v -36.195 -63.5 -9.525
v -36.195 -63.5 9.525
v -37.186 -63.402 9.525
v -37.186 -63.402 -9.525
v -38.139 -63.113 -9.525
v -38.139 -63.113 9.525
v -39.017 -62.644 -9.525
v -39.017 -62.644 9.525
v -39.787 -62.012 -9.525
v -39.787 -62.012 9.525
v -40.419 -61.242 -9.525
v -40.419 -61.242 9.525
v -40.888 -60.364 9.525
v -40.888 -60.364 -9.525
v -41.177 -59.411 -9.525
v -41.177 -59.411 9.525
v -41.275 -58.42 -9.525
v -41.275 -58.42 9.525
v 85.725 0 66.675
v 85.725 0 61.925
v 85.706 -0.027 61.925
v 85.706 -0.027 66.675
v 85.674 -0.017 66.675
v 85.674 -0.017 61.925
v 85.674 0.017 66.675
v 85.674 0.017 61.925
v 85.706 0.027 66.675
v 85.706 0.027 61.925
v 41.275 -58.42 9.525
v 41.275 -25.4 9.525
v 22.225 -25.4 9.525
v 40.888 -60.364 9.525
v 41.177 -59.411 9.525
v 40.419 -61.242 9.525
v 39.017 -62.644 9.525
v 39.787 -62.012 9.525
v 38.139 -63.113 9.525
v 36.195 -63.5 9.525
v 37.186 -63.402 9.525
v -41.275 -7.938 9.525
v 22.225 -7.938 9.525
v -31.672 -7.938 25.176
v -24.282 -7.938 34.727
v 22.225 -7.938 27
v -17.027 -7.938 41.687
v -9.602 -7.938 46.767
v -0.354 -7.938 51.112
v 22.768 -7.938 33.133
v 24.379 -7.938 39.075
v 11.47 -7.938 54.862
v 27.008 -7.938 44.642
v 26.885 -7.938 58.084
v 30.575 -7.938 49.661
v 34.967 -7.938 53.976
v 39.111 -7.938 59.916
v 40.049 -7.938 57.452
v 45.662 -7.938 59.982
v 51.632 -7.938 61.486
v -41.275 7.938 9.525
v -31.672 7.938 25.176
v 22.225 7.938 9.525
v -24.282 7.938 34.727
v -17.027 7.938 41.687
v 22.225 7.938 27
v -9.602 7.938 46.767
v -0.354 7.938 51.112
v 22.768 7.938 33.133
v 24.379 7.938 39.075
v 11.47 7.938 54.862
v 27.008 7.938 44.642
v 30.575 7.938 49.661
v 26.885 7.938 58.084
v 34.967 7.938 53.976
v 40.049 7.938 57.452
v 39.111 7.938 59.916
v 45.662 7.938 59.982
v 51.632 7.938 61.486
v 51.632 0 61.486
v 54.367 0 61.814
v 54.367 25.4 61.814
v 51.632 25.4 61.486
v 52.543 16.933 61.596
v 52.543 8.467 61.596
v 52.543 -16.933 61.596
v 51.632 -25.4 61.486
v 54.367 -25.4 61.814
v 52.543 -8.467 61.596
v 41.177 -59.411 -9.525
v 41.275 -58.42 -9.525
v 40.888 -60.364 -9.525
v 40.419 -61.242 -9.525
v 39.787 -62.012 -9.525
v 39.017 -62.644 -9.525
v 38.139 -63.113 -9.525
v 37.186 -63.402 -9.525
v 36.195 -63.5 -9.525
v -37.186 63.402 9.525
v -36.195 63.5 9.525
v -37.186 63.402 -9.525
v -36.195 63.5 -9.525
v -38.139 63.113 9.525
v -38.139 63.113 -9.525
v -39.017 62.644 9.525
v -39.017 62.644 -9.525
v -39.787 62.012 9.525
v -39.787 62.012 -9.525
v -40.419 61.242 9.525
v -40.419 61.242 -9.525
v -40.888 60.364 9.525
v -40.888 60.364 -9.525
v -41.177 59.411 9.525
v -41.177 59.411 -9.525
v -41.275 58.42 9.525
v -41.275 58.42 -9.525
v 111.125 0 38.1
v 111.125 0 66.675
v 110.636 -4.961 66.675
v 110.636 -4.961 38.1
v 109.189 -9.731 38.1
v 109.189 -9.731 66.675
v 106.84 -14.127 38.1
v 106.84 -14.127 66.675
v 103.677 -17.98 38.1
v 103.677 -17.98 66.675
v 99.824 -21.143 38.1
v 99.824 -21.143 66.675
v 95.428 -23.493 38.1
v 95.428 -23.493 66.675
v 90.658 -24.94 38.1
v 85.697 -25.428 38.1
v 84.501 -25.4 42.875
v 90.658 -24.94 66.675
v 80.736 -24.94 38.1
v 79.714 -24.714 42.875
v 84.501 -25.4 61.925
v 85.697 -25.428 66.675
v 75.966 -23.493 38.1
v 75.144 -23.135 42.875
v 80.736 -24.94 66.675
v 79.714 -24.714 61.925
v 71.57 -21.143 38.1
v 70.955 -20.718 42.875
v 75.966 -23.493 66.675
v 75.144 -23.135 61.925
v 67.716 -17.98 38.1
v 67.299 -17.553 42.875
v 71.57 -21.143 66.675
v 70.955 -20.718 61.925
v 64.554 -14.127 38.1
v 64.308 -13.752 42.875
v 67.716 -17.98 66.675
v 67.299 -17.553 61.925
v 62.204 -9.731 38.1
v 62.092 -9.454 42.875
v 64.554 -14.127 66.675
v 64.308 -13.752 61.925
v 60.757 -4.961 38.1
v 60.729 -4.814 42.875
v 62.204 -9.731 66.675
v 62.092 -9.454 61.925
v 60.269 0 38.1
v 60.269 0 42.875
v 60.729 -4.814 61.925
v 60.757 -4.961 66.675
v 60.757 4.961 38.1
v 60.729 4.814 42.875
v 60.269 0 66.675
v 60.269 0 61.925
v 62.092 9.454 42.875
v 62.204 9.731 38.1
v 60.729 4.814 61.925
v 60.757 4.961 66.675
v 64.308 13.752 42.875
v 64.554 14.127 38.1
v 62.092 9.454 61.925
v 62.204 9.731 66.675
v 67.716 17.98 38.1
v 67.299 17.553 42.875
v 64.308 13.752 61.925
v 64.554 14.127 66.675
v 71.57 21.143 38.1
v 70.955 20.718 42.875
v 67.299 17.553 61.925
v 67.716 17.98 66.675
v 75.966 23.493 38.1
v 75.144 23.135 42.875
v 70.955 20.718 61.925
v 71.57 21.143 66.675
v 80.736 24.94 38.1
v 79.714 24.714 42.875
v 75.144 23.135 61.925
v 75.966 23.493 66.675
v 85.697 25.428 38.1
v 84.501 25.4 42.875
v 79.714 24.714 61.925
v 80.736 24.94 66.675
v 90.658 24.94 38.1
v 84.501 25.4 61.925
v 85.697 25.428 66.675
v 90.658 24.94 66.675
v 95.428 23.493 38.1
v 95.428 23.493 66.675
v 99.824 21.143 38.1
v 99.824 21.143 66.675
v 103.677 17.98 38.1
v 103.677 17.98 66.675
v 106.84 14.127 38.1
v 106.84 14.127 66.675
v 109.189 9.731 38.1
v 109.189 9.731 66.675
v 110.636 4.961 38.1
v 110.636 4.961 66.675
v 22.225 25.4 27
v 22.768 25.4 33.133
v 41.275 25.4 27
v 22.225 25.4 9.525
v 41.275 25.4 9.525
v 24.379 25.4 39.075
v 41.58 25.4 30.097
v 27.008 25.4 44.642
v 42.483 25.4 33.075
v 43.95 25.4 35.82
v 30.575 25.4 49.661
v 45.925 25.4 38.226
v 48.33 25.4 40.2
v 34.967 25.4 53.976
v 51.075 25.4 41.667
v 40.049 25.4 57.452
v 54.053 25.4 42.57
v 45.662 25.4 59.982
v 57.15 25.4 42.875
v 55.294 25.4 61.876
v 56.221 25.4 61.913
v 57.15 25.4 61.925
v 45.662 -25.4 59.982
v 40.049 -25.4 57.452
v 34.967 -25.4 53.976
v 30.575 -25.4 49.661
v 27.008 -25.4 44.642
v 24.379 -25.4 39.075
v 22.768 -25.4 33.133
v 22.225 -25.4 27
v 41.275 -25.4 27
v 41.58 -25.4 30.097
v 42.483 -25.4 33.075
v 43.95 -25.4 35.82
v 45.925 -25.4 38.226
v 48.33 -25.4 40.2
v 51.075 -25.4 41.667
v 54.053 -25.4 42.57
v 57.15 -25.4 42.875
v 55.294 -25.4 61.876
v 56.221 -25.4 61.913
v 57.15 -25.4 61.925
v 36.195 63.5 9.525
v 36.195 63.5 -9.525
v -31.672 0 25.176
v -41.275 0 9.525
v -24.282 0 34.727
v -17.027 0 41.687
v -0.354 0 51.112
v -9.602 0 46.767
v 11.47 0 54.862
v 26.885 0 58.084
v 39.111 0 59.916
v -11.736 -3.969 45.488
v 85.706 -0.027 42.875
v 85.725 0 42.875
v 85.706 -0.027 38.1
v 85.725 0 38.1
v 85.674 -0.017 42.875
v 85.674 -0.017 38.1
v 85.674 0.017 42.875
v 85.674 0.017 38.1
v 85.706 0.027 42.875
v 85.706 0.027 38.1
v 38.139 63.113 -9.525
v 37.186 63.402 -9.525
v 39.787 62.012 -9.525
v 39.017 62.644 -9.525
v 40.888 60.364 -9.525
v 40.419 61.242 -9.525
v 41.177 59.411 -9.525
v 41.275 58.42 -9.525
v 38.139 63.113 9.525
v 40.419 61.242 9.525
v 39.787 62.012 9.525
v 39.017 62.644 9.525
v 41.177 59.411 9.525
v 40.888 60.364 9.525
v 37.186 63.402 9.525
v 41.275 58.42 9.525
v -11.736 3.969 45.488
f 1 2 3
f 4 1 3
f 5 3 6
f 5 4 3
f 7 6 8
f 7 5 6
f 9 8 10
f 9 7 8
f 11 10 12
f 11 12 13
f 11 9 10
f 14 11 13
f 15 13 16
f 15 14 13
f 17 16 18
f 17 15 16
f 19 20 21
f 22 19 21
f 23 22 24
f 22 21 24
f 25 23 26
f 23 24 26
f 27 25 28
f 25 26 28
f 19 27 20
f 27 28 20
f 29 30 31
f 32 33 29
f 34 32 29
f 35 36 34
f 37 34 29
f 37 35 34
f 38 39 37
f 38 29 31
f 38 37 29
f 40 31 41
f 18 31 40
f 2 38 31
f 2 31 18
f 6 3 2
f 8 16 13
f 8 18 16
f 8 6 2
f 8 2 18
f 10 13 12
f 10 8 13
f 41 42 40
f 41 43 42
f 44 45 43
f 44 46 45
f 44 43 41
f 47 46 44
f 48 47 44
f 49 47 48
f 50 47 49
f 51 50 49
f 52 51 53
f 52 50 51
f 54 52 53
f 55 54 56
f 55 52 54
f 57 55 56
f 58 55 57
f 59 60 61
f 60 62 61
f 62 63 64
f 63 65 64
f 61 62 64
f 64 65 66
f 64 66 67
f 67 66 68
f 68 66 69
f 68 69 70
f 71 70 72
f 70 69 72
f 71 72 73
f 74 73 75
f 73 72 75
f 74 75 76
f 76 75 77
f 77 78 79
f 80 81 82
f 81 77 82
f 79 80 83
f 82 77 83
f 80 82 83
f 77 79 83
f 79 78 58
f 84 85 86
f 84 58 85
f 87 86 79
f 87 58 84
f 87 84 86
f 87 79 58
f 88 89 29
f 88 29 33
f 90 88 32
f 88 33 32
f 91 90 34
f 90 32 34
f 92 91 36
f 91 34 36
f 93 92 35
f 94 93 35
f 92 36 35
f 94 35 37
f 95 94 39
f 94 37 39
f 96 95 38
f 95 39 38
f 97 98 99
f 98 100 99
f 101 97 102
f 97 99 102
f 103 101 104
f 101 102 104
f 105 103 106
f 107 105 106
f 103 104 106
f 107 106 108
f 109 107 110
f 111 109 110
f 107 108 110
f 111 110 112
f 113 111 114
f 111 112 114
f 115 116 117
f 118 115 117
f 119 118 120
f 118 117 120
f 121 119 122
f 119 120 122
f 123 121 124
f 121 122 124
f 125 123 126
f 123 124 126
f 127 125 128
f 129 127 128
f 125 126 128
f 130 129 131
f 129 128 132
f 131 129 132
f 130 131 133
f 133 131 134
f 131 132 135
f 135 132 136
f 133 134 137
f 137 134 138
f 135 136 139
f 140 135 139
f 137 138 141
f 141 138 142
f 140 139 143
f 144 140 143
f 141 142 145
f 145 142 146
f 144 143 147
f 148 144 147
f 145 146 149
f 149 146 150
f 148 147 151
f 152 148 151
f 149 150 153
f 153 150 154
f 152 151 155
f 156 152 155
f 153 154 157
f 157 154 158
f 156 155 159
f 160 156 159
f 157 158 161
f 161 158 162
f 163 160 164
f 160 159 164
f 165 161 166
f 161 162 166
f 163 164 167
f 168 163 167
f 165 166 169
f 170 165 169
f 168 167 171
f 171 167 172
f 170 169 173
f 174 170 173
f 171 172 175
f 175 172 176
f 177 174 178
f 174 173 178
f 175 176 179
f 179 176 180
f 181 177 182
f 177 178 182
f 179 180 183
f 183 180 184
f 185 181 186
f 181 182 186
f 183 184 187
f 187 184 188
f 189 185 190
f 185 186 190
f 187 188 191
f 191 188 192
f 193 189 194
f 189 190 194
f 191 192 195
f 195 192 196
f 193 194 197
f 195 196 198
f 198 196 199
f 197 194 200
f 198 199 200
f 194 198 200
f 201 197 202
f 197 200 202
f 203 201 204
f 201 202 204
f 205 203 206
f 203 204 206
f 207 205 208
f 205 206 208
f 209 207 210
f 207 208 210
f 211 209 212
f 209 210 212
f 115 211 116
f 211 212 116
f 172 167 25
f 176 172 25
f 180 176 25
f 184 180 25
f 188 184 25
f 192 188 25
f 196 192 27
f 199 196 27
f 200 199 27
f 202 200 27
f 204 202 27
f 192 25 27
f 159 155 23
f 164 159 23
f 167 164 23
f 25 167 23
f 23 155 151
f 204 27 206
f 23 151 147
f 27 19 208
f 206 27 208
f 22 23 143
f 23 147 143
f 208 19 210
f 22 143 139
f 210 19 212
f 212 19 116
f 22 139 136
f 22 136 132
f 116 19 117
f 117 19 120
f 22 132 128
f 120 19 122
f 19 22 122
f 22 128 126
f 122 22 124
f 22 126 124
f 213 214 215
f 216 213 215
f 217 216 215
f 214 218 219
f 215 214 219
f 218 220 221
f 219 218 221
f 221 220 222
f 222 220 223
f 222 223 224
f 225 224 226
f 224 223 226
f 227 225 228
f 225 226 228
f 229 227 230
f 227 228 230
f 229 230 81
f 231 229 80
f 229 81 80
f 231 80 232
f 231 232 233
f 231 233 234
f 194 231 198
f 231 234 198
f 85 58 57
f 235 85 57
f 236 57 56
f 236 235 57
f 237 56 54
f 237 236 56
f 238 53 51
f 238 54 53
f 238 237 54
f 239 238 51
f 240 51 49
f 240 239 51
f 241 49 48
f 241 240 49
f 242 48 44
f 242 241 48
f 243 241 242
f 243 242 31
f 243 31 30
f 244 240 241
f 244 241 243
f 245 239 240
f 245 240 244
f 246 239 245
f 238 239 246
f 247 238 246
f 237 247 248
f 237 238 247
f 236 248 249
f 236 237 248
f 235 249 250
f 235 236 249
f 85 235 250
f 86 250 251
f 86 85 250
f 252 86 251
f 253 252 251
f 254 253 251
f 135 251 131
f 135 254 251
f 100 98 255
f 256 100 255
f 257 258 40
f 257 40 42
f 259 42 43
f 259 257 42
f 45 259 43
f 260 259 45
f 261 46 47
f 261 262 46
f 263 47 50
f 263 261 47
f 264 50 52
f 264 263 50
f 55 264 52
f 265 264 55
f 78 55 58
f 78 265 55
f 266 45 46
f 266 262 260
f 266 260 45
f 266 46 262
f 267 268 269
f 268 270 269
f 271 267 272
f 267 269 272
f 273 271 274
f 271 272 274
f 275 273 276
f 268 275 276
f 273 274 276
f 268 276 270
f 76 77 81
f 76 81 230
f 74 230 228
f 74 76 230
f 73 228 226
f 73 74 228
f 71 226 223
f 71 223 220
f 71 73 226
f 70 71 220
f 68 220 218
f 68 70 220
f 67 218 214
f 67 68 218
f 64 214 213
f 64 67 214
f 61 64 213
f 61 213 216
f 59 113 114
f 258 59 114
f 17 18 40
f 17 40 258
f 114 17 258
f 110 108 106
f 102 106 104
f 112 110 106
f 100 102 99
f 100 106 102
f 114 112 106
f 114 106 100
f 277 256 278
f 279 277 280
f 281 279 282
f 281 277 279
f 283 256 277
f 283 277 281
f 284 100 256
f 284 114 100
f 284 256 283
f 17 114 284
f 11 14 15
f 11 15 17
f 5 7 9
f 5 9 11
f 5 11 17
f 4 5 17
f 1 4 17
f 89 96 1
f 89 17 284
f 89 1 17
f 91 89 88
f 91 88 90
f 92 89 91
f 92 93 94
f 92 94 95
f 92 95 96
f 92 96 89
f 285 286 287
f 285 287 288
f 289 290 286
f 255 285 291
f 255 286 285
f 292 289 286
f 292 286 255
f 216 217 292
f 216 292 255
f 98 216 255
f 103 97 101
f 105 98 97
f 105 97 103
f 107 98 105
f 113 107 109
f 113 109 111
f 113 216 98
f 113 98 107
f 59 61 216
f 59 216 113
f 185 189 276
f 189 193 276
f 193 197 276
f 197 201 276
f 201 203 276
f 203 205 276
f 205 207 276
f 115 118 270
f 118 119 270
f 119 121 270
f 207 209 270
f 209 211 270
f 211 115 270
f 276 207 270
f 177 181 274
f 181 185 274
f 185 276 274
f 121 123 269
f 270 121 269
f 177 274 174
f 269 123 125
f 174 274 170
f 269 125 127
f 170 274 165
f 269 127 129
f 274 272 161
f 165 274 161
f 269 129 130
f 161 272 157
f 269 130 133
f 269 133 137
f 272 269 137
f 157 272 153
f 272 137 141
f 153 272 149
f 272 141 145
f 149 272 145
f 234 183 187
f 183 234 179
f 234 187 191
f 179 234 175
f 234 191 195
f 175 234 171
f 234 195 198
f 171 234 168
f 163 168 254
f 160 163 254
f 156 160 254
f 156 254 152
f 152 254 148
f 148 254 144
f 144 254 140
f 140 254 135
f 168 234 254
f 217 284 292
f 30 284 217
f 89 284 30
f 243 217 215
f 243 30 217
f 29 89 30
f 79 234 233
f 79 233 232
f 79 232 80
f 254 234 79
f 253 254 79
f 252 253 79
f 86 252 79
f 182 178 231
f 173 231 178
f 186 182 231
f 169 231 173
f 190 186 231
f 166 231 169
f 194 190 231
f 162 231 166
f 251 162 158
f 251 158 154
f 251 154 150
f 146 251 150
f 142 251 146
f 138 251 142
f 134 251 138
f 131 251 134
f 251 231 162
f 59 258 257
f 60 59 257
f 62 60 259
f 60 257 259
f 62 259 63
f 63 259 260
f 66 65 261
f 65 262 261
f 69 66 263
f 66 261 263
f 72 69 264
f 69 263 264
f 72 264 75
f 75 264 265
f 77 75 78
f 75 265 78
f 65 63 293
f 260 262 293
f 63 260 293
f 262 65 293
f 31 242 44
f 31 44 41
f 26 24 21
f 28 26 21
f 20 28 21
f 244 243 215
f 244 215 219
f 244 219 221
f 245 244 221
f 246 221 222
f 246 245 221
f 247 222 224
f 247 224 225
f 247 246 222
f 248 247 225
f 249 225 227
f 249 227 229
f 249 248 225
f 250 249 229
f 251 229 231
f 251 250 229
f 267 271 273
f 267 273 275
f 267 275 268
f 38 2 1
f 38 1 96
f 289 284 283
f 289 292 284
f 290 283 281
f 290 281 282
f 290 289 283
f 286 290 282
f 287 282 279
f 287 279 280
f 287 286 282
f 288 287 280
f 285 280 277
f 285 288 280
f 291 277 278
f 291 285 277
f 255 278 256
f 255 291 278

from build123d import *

# Parameters (mm, degrees)
F1_DEPTH = 63.5
F2_DEPTH = 25.4
F0_W     = 25.4
F0_H     = 19.05
F4_DEPTH = 25.4
F5_DEPTH = 7.9375
F7_R     = 5.08


# Not quite as in the source:
# - a feature names something its author has since deleted; it is built from what else it names


with BuildPart() as f1:
    # F0 (on Front) → F1 (new body, symmetric)
    with BuildSketch(Plane.XZ):
        Polygon((41.275, -9.525), (41.275, 9.525), (22.225, 9.525), (-41.275, 9.525), (-41.275, -9.525), align=None)
    extrude(amount=F1_DEPTH, both=True)

    # F0 (on Front) → F2 (join, symmetric)
    with BuildSketch(Plane.XZ):
        with BuildLine():
            Line((22.225, 9.525), (41.275, 9.525))
            Line((41.275, 9.525), (41.275, 27.0002))
            ThreePointArc((41.275, 27.0002), (45.9246798487, 38.2255201513), (57.15, 42.8752))
            Line((57.15, 42.8752), (60.325, 42.8752))
            Line((60.325, 42.8752), (60.325, 61.9252))
            Line((60.325, 61.9252), (57.15, 61.9252))
            ThreePointArc((57.15, 61.9252), (55.7573840511, 61.8974240417), (54.3669832056, 61.8141403475))
            add(Edge.make_bspline(
                [(51.6315731061, 61.4864666813), (52.5431025701, 61.5959254015), (53.4550436694, 61.7050265498), (54.3669832056, 61.8141403475)],
                knots=[0.9798743177, 0.9798743177, 0.9798743177, 0.9798743177, 1, 1, 1, 1], degree=3))
            ThreePointArc((51.6315731061, 61.4864666813), (30.5747607323, 49.6610094045), (22.225, 27.0002))
            Line((22.225, 27.0002), (22.225, 9.525))
        make_face()
    extrude(amount=F2_DEPTH, both=True)

    # F0 (on Front) → F4 (join, symmetric)
    with BuildSketch(Plane.XZ):
        with Locations((73.025, 52.4002)):
            Rectangle(F0_W, F0_H)
    extrude(amount=F4_DEPTH, both=True)

    # F0 (on Front) → F5 (join, symmetric)
    with BuildSketch(Plane.XZ):
        with BuildLine():
            Line((-41.275, 9.525), (22.225, 9.525))
            Line((22.225, 9.525), (22.225, 27.0002))
            ThreePointArc((22.225, 27.0002), (30.5747607323, 49.6610094045), (51.6315731061, 61.4864666813))
            add(Edge.make_bspline(
                [(-41.275, 9.525), (-33.3226171476, 23.2066083148), (-16.1059236769, 52.8331960278), (27.7493063598, 58.6186248213), (51.6315731061, 61.4864666813)],
                knots=[0, 0, 0, 0, 0.4525771396, 0.9798743177, 0.9798743177, 0.9798743177, 0.9798743177], degree=3))
        make_face()
    extrude(amount=F5_DEPTH, both=True)

    # F0 (on Front) → F6 (revolve)
    with BuildSketch(Plane.XZ):
        Polygon((85.725, 61.9252), (85.725, 42.8752), (85.725, 38.1), (111.125, 38.1), (111.125, 66.675), (85.725, 66.675), align=None)
    revolve(axis=Axis((85.6968834996, 0, 52.5015871972), (0, 0, -1)))

    # F7
    f7_edges = [f1.edges().sort_by_distance(p)[0] for p in [
        (41.275, -63.5, 0),
        (-41.275, -63.5, 0),
        (41.275, 63.5, 0),
        (-41.275, 63.5, 0),
    ]]
    fillet(f7_edges, radius=F7_R)


solid = f1.part
